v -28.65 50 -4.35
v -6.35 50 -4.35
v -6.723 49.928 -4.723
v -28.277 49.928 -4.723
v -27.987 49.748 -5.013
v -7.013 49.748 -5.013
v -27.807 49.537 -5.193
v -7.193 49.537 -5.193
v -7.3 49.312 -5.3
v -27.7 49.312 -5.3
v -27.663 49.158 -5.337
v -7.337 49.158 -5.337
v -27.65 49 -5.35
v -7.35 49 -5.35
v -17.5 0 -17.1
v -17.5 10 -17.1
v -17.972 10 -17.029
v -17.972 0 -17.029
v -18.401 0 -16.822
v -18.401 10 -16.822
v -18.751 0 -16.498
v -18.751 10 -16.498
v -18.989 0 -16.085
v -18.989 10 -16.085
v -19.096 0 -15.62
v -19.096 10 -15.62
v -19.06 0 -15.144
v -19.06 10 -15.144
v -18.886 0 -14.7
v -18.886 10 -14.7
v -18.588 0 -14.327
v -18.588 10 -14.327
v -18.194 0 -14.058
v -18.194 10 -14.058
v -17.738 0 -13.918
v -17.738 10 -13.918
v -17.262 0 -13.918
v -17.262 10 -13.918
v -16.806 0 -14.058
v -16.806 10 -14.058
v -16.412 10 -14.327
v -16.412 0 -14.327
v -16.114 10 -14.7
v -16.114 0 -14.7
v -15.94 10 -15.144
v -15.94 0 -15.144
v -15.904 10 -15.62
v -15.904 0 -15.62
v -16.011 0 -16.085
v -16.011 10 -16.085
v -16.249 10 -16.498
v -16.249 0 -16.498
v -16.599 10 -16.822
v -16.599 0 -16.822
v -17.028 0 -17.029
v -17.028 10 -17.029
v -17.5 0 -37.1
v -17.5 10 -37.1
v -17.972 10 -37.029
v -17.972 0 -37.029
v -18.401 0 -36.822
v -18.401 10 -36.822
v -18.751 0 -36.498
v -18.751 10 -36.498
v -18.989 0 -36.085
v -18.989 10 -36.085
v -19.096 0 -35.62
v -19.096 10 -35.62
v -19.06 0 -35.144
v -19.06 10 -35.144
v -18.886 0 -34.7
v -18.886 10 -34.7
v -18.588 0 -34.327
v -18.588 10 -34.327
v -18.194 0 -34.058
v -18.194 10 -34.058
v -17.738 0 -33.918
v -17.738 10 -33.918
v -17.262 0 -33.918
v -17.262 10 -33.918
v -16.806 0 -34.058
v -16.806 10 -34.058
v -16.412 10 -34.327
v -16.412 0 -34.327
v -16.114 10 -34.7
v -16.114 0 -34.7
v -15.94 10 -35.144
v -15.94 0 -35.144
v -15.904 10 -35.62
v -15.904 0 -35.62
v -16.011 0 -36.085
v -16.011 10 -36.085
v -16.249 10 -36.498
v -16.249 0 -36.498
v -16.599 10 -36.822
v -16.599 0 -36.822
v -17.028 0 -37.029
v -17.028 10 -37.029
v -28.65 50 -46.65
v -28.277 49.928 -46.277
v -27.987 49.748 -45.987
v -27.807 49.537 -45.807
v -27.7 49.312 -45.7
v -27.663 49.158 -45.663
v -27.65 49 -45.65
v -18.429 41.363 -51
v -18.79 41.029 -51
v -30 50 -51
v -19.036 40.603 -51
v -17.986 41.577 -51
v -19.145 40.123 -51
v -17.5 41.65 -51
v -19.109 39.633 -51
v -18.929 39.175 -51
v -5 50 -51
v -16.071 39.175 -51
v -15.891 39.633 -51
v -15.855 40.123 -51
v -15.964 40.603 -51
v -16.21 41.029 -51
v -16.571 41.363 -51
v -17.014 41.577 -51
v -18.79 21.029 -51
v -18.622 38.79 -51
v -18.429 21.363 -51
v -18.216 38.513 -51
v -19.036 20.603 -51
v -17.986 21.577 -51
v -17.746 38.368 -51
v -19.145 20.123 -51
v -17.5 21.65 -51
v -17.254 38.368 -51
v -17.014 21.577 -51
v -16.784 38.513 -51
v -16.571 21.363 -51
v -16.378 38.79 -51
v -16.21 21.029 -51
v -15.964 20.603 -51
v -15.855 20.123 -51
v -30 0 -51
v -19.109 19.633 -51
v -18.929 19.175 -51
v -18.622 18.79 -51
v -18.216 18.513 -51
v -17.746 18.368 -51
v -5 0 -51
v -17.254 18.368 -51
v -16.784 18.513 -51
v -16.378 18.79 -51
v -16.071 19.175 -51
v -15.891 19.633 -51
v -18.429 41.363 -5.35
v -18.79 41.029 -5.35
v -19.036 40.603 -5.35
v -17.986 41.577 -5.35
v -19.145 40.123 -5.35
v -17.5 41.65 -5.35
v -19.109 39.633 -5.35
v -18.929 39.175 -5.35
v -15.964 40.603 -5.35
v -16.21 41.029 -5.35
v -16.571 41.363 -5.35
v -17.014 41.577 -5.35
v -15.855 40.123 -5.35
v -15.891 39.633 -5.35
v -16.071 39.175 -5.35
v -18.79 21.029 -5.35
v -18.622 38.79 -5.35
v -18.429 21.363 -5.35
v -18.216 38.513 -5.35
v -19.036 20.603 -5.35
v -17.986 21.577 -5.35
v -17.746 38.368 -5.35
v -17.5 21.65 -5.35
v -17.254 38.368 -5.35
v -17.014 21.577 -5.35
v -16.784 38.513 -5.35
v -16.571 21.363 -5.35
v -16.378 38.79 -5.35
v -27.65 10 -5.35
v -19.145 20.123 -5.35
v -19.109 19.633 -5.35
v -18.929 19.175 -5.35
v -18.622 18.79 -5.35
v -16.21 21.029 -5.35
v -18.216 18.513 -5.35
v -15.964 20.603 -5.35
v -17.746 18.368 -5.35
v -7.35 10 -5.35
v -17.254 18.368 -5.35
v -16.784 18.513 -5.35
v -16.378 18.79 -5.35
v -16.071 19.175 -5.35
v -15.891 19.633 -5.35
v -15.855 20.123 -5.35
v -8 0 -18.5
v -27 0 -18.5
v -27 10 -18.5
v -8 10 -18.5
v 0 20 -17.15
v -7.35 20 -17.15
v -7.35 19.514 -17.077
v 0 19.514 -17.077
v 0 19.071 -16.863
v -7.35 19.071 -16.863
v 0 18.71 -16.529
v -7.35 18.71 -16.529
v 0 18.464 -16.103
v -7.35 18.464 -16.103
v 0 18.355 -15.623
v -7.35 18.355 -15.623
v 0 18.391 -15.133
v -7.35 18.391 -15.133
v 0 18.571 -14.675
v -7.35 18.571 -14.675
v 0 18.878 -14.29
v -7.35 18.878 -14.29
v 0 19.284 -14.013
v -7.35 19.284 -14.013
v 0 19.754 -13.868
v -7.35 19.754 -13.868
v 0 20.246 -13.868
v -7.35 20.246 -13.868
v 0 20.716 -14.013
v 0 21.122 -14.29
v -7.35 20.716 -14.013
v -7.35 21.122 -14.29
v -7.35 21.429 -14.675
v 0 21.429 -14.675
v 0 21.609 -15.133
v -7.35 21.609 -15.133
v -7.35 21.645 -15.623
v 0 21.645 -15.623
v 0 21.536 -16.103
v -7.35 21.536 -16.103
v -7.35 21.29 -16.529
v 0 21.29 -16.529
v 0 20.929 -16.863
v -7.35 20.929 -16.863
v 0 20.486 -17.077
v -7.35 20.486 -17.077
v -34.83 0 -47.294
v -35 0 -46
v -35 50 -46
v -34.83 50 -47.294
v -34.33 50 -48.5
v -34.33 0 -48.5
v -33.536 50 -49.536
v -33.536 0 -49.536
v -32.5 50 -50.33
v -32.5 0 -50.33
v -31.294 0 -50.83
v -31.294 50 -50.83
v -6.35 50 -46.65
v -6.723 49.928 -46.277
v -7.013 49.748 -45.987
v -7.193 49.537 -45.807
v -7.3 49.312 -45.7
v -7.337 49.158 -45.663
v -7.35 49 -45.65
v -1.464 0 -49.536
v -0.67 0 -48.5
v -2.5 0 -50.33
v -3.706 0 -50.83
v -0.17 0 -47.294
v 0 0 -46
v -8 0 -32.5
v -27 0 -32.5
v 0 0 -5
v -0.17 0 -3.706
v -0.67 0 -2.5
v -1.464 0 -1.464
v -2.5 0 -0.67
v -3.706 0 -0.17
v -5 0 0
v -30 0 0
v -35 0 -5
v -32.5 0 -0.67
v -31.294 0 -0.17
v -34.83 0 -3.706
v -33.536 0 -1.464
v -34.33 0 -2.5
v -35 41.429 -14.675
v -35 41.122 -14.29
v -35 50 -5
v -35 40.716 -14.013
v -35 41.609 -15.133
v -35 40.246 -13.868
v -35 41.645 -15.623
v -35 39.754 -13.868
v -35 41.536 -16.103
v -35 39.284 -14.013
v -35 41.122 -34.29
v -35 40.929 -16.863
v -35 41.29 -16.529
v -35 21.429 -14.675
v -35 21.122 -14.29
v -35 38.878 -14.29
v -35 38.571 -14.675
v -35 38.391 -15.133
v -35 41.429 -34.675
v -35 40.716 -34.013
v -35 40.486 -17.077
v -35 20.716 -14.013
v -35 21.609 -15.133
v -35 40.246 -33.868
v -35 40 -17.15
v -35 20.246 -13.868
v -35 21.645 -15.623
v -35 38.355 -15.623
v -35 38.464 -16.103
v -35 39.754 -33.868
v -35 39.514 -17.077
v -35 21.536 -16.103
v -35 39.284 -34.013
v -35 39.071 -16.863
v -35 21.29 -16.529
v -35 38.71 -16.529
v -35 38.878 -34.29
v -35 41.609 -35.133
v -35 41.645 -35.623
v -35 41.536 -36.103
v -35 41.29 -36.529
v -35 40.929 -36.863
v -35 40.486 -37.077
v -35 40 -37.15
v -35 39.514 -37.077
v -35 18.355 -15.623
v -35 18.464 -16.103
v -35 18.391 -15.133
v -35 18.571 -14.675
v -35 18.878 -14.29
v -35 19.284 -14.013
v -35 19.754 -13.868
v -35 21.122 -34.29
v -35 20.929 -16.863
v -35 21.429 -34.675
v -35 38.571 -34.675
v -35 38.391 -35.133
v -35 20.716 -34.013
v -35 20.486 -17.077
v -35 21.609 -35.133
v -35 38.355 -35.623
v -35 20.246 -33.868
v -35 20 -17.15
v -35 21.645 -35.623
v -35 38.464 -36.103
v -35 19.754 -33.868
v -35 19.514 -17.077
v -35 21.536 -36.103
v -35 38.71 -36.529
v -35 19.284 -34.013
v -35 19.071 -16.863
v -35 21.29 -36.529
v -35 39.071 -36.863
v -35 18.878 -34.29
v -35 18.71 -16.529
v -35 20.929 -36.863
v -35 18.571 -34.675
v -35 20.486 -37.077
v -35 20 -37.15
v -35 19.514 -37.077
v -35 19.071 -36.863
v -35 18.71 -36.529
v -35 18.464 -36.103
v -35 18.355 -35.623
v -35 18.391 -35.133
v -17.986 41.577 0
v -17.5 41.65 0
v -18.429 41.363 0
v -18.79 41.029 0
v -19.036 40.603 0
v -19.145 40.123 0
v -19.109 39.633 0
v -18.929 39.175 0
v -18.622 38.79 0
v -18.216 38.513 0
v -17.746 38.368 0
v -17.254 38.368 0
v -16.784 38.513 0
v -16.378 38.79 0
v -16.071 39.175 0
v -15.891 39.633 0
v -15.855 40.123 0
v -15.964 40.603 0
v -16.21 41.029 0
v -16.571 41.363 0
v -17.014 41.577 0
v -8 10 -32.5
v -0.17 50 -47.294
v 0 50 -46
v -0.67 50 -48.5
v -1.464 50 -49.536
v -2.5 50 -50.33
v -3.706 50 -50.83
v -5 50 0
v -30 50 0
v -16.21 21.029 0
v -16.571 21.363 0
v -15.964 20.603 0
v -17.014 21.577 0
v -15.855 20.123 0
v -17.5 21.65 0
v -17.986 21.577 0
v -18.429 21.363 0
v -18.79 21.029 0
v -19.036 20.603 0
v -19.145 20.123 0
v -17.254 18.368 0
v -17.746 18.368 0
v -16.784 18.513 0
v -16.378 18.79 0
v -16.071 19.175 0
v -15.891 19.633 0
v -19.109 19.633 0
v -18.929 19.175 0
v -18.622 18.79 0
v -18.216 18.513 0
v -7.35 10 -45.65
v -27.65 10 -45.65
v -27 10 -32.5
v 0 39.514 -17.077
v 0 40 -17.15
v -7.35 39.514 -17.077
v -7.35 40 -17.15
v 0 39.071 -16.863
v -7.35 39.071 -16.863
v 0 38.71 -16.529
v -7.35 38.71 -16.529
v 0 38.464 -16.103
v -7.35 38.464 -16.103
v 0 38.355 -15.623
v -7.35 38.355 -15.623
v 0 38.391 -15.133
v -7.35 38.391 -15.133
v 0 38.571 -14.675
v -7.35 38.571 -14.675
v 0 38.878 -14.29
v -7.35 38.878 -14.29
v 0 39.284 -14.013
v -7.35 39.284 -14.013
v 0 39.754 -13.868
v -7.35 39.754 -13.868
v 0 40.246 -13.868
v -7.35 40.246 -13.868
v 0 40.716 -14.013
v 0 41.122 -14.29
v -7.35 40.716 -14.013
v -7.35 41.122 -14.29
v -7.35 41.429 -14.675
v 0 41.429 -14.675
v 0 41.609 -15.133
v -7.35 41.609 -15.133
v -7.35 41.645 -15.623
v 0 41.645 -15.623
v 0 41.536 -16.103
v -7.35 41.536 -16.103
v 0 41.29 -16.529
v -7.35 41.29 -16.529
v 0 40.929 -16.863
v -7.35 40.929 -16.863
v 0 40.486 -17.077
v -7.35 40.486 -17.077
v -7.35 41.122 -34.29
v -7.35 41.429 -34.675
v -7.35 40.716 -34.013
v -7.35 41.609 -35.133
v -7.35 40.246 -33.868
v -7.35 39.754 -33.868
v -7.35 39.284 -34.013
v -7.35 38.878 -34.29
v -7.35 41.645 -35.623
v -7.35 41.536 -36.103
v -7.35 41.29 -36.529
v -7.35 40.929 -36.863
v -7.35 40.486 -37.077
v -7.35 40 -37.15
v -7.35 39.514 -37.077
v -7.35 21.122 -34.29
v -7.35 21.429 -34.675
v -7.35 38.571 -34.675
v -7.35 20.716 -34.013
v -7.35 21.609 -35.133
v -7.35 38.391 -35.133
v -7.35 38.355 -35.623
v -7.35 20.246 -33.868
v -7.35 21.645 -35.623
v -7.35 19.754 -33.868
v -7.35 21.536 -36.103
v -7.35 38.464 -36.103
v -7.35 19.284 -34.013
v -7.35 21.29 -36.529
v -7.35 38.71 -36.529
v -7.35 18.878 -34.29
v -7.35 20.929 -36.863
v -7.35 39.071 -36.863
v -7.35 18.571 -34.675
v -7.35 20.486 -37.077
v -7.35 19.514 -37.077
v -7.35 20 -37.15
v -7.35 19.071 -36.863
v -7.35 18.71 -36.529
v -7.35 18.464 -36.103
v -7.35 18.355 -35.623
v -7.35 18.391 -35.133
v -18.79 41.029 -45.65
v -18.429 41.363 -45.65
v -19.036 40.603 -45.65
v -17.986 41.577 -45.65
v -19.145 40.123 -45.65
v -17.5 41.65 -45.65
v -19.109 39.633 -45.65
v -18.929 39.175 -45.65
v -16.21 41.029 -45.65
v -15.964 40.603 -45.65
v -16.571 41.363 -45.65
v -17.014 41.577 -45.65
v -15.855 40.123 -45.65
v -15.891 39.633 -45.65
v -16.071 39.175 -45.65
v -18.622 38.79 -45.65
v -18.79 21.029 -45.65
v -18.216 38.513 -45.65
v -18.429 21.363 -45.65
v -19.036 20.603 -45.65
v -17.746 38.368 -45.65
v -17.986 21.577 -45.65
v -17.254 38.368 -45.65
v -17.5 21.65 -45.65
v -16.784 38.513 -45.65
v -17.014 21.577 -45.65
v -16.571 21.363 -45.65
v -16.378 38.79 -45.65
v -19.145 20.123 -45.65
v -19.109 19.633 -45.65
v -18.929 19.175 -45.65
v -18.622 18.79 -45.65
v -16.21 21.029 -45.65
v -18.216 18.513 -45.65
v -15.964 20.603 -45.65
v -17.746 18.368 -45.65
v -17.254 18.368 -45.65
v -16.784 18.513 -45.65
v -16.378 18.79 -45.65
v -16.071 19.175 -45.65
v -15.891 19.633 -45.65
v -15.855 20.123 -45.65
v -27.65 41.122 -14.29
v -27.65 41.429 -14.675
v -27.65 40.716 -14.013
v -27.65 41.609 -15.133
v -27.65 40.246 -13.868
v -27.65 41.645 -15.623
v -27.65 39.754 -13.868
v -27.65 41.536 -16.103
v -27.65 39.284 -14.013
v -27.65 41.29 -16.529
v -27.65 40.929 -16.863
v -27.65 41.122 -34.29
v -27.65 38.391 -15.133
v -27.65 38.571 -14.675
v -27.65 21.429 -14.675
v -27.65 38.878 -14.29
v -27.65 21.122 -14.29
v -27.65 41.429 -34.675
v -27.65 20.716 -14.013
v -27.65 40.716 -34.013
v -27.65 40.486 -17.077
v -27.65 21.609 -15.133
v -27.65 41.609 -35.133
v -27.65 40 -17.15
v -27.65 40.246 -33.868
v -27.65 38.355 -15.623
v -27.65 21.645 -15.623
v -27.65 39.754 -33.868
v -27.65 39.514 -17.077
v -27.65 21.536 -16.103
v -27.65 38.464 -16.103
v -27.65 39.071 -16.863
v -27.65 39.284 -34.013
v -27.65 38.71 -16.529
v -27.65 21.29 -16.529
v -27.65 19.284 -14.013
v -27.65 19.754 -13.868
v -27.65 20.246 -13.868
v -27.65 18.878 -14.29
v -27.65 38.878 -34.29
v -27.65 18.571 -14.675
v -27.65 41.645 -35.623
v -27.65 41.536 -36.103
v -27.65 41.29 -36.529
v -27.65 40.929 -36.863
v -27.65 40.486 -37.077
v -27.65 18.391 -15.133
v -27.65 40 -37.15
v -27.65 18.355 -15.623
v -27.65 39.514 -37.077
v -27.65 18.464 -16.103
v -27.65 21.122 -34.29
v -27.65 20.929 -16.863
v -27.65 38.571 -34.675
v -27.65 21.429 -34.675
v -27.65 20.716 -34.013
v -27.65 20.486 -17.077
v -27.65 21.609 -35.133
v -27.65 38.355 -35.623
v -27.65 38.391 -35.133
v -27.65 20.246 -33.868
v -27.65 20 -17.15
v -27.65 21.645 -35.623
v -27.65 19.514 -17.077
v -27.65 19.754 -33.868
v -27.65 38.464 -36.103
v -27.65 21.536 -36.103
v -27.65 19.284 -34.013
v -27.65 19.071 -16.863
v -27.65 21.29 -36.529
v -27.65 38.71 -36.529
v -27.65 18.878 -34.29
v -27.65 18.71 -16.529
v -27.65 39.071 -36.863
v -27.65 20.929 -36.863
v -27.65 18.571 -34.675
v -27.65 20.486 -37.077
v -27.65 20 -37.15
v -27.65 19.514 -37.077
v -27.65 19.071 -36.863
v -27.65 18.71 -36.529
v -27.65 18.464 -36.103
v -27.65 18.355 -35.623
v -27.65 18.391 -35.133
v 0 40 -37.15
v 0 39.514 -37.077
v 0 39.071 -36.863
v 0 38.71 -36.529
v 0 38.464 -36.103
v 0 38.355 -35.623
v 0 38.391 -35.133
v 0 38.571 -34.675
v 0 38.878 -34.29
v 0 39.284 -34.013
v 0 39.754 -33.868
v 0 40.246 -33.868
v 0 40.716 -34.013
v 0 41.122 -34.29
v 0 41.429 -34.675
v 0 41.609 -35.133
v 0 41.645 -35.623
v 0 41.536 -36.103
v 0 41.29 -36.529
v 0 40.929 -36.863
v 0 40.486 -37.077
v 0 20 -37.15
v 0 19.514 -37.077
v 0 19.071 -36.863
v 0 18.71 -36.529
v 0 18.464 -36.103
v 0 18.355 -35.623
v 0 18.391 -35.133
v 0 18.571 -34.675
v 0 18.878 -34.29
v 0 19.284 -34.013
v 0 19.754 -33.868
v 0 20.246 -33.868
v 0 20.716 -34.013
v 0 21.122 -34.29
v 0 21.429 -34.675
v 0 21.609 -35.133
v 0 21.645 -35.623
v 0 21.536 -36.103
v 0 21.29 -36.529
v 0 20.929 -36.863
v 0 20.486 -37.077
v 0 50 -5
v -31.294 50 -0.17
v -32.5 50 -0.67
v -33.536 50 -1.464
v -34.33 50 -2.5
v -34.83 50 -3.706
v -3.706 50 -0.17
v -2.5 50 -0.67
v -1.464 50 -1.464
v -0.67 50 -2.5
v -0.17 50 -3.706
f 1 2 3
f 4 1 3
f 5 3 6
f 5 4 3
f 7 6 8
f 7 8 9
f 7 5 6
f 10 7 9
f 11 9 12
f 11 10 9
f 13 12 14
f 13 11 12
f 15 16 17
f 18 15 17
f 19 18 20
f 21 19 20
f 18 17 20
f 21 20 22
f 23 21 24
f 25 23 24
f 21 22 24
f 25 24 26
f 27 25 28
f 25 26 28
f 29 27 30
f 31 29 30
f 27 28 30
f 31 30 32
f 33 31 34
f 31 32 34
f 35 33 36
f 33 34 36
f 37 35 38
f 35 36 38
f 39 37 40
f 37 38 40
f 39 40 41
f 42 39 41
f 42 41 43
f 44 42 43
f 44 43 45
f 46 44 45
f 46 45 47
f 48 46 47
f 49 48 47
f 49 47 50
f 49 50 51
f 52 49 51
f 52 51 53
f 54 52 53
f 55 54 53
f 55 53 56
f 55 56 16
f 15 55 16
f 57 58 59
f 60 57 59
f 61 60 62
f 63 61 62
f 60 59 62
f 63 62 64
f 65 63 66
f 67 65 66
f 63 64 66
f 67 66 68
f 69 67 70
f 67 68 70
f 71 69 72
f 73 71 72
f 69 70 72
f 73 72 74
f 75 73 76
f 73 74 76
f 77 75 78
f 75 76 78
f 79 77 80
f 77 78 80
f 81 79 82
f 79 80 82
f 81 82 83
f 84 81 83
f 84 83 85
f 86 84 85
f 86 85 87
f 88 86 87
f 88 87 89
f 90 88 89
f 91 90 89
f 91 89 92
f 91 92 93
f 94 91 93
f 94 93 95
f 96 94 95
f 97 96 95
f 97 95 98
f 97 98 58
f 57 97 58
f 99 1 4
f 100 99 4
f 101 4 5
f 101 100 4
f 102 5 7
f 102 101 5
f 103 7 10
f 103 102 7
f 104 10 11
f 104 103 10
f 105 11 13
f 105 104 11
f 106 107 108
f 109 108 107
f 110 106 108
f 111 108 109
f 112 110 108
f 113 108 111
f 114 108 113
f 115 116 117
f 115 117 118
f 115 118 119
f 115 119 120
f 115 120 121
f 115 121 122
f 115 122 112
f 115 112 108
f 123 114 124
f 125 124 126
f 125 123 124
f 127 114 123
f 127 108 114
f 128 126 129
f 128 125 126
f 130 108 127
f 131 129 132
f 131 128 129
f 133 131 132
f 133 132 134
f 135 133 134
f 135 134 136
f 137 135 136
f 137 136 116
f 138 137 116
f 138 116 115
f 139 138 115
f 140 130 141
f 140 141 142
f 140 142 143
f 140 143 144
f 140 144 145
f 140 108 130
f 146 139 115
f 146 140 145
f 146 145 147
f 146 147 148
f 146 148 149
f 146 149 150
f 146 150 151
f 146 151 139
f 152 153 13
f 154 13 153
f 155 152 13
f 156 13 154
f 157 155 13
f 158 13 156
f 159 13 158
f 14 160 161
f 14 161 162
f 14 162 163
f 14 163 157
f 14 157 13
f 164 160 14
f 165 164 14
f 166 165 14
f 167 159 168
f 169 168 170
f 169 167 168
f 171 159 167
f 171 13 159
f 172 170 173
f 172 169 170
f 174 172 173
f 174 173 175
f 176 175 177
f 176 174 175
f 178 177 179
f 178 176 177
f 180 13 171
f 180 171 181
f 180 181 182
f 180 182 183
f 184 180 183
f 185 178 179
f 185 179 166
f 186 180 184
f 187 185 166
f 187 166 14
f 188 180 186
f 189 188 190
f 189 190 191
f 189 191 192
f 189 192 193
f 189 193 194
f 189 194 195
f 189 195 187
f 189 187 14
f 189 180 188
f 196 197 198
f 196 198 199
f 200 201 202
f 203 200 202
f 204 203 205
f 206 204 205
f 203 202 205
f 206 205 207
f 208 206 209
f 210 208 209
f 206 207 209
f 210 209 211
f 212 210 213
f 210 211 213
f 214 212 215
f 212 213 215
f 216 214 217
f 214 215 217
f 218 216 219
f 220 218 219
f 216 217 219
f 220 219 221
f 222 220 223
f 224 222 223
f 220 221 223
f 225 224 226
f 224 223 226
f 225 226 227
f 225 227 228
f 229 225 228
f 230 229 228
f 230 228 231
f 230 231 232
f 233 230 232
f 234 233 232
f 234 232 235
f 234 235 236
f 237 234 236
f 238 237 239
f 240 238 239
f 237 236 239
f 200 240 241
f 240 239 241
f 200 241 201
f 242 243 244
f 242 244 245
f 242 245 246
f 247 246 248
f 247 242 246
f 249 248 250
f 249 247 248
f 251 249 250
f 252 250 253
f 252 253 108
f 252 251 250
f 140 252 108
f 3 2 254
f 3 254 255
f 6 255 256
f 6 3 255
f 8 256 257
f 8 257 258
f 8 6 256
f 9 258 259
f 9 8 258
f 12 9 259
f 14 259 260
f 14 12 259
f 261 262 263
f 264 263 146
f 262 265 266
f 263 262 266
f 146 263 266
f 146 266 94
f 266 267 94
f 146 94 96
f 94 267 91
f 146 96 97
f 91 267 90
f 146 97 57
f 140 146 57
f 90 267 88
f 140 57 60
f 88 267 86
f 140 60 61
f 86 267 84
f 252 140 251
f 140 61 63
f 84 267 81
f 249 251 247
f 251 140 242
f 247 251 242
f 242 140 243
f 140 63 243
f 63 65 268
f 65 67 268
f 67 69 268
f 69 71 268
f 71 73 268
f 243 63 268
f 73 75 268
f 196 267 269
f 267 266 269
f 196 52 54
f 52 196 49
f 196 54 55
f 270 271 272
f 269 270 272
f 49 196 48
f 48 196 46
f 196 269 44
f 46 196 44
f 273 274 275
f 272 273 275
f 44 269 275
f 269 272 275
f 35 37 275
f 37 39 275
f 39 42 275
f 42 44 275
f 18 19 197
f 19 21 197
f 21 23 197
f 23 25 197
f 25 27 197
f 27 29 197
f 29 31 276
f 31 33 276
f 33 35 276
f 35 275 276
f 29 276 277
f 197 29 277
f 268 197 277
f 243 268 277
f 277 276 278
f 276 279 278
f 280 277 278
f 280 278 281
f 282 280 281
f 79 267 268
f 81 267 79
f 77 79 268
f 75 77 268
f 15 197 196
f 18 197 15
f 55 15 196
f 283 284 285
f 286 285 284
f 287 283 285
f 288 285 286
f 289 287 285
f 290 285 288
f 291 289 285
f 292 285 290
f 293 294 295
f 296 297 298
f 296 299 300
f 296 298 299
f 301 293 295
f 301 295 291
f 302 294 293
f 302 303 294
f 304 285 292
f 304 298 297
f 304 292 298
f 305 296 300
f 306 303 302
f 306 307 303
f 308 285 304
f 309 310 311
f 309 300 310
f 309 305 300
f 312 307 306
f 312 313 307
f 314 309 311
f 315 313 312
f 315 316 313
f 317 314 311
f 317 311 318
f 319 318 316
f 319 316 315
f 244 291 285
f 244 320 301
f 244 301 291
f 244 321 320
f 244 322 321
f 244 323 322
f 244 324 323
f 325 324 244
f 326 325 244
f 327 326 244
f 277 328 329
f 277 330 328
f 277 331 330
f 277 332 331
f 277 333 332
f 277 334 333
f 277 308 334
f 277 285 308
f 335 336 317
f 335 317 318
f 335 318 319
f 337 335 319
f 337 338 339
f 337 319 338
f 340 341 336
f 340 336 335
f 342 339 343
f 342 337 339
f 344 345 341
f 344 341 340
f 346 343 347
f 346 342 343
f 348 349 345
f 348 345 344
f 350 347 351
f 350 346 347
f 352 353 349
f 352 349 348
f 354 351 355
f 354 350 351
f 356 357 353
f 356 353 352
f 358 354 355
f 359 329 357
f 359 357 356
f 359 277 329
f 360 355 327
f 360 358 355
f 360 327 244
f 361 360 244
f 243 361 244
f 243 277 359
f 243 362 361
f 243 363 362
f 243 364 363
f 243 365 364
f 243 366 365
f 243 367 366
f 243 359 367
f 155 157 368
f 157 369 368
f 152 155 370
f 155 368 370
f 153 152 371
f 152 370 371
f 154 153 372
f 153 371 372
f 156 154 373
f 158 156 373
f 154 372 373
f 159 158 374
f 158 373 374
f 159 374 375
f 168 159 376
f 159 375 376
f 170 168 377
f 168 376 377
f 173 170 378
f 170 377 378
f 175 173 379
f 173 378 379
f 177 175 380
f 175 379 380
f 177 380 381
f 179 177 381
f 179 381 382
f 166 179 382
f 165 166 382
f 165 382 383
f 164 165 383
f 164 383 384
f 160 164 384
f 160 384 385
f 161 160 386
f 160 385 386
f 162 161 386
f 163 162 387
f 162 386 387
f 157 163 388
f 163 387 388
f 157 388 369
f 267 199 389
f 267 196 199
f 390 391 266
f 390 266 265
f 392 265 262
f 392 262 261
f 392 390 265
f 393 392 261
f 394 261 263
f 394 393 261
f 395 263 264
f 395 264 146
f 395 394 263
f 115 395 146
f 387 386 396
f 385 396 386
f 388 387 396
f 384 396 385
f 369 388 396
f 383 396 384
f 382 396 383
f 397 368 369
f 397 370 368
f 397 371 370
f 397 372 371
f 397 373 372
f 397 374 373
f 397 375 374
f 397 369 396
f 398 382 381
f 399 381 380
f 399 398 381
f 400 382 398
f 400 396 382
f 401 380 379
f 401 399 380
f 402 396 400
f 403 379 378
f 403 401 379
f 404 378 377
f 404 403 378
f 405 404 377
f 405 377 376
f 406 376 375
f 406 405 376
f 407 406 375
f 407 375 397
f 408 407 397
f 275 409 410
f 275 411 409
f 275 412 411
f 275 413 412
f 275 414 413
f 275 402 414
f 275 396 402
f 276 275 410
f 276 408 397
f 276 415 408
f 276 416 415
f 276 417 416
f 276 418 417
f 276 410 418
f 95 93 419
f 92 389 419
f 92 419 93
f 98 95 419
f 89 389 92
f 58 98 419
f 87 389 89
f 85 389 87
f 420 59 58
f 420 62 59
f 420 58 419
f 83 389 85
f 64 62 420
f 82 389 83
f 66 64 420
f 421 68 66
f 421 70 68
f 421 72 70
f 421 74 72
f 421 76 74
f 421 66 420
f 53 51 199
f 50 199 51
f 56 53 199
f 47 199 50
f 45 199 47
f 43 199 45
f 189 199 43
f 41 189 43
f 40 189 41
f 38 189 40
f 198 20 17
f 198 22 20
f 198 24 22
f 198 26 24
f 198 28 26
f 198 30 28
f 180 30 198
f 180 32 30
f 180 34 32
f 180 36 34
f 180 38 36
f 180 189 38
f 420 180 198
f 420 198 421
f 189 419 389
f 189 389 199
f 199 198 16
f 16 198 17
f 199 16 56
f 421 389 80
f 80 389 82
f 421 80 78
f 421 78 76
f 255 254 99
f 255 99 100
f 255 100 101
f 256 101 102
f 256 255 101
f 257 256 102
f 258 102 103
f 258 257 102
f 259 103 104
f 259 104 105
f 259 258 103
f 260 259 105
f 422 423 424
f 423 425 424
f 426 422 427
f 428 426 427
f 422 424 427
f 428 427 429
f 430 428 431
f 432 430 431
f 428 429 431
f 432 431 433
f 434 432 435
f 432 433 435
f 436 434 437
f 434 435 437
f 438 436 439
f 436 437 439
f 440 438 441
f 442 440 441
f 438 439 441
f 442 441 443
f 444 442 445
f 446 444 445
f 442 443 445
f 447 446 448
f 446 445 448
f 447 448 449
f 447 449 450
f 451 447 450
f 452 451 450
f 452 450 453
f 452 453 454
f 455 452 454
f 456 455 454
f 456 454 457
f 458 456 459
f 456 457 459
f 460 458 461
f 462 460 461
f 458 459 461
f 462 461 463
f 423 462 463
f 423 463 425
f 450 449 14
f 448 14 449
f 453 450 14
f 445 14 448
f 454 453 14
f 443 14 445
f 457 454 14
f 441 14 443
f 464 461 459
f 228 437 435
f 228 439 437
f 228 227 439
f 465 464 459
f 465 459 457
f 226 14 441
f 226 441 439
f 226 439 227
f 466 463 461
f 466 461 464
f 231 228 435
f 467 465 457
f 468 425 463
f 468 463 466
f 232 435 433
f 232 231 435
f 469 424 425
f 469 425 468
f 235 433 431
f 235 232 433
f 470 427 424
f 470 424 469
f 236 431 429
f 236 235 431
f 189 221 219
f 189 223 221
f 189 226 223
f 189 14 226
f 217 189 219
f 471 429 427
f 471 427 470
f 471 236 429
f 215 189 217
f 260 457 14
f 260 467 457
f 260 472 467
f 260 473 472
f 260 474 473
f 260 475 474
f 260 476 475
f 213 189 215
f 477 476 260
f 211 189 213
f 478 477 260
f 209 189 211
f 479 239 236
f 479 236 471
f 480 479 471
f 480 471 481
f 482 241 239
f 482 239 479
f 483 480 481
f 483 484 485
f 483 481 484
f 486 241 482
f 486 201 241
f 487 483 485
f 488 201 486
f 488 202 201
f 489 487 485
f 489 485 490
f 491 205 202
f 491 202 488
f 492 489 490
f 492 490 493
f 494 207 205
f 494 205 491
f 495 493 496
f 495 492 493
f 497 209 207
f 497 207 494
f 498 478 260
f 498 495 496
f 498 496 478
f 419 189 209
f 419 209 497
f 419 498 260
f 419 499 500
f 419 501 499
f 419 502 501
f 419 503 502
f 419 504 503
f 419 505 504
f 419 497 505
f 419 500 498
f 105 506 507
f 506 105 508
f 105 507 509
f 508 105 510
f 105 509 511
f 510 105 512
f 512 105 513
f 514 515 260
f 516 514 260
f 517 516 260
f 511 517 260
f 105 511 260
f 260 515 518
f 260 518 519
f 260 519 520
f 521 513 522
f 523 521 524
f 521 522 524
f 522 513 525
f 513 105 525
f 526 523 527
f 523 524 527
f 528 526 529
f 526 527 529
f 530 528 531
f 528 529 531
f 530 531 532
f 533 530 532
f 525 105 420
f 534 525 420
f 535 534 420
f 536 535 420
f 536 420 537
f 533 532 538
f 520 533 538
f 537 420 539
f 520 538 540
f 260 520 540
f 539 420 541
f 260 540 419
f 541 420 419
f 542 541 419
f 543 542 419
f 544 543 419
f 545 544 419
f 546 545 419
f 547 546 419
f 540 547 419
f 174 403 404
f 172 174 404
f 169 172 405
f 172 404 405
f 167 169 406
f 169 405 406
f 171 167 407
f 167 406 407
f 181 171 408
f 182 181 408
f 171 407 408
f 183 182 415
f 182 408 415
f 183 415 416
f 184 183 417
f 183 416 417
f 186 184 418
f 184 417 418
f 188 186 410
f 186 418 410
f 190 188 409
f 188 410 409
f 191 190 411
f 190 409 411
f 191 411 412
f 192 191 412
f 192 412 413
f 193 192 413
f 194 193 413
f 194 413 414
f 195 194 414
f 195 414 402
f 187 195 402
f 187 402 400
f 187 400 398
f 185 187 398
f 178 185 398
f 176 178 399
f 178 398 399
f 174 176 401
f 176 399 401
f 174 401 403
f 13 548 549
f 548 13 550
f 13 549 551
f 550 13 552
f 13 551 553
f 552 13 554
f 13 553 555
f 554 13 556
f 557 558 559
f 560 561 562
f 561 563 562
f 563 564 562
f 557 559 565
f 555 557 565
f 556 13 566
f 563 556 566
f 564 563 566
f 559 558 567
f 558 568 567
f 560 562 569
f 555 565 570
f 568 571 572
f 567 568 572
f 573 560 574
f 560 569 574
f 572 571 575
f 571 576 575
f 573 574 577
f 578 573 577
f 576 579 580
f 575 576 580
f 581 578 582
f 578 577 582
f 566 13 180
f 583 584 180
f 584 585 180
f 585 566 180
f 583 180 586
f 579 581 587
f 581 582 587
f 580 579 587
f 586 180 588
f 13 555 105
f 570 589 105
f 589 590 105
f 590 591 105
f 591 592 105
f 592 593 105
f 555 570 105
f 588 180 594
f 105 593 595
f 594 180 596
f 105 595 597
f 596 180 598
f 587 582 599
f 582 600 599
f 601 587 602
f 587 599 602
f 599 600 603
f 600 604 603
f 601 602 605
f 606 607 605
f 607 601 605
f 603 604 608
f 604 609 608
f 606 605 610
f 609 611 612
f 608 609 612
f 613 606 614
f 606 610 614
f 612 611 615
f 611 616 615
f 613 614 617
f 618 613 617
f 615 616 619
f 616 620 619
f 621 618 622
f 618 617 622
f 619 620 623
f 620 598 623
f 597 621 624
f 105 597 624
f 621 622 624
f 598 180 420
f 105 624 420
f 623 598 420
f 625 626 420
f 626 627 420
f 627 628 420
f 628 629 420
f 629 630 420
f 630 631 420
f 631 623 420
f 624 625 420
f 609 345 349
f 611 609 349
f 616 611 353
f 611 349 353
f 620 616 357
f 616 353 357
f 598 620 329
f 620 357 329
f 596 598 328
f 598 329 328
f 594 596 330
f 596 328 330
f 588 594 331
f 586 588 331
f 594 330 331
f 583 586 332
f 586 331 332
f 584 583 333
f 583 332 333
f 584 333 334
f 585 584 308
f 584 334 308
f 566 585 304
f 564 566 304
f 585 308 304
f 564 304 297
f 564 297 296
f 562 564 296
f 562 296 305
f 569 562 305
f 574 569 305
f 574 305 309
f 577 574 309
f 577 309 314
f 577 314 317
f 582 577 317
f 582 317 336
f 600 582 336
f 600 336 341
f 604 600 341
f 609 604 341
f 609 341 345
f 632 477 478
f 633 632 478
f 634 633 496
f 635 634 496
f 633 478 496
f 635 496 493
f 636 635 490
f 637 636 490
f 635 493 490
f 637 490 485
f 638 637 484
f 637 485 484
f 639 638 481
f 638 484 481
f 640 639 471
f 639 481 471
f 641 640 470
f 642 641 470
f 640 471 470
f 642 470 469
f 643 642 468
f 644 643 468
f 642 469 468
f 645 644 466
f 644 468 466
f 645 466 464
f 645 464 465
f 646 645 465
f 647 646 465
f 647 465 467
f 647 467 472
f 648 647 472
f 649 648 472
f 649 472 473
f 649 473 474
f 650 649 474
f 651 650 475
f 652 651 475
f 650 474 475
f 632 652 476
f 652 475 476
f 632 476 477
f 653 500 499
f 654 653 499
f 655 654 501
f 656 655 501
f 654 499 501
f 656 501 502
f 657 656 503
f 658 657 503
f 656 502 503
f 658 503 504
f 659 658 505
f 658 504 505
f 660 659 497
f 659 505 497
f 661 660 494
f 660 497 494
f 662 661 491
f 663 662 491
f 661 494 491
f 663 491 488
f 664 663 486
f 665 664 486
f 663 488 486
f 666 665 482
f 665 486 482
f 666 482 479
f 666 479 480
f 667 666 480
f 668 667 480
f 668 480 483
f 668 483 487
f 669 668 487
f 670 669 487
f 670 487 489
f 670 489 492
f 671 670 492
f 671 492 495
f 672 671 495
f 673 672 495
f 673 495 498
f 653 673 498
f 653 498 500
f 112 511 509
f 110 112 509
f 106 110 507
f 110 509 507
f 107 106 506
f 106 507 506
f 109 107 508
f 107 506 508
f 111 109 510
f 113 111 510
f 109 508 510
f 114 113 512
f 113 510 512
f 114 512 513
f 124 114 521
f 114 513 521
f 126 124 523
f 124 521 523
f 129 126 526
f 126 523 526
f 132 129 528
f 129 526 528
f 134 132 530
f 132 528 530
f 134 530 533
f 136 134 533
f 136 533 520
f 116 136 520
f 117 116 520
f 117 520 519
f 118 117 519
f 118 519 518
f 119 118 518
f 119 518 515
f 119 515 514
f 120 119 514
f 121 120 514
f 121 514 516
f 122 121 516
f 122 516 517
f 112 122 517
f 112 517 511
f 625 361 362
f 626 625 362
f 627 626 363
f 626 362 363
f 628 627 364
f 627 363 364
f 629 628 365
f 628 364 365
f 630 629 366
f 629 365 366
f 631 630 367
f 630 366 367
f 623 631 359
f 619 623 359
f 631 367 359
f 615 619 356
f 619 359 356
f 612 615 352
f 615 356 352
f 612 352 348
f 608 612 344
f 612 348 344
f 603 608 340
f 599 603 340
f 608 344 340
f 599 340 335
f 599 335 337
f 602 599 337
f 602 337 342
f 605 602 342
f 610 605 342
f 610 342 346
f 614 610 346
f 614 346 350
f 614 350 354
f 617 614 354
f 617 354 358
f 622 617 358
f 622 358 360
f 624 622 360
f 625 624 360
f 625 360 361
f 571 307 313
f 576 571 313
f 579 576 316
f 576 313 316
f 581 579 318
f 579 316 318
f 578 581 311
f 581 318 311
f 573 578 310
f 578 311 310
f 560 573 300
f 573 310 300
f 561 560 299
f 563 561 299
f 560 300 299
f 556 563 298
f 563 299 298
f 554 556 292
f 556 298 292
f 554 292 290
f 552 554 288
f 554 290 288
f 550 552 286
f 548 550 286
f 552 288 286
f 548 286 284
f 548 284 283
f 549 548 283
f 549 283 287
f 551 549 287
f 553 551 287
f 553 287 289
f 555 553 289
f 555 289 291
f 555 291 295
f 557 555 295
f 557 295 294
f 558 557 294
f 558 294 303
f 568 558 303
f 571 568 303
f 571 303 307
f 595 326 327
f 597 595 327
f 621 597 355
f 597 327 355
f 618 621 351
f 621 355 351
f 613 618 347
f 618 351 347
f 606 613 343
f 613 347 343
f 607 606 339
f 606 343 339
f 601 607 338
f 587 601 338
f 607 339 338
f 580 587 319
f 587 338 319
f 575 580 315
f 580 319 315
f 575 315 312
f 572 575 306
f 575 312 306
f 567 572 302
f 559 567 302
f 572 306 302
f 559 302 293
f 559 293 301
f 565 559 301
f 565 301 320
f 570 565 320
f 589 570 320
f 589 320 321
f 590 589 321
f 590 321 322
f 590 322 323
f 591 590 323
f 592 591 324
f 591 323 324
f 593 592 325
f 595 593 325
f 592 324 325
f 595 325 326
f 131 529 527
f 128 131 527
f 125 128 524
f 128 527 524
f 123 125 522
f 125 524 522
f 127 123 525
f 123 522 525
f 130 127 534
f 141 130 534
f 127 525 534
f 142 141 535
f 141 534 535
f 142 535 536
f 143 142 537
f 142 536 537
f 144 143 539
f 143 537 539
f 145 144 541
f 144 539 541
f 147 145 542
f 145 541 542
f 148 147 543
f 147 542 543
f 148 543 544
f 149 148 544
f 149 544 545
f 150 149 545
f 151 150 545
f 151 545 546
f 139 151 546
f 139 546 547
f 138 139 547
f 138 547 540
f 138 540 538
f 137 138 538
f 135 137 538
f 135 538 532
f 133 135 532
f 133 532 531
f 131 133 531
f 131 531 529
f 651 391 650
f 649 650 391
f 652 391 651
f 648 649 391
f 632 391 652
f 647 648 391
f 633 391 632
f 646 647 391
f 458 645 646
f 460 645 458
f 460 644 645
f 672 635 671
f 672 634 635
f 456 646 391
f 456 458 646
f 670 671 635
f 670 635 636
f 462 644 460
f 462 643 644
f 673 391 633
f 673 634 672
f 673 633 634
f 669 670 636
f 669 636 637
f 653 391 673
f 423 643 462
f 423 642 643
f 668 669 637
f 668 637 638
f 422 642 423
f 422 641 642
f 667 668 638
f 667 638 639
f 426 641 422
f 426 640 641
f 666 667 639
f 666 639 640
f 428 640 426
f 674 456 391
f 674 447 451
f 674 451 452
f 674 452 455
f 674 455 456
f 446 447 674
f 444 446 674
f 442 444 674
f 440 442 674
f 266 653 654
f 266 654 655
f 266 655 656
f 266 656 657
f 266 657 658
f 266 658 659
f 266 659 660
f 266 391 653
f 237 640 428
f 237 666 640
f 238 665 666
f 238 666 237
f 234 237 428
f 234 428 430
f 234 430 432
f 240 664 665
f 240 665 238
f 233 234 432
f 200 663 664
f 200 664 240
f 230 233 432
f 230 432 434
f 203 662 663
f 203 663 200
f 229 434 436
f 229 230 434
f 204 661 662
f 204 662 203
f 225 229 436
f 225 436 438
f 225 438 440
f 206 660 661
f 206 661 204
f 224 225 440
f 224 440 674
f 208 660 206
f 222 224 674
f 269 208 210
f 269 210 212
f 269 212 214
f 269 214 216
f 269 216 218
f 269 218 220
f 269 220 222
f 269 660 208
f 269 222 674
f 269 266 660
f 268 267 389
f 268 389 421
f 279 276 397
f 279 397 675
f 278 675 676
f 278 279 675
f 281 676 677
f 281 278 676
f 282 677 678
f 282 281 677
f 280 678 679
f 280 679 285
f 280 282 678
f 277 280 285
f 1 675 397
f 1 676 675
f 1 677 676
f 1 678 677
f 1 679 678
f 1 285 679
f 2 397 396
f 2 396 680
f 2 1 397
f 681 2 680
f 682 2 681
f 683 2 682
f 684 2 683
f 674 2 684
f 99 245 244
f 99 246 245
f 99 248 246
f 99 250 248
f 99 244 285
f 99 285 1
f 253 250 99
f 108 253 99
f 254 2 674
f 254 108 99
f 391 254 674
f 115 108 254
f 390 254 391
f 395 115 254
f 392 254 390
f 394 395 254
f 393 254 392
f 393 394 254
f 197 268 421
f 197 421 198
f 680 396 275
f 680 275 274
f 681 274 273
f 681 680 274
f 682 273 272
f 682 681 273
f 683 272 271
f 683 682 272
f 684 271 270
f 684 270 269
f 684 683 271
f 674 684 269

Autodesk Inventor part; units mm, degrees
ref_plane "YZ Plane" through (0, 0, 0) normal (1, 0, 0) x (0, 1, 0)
ref_plane "XZ Plane" through (0, 0, 0) normal (0, 1, 0) x (-1, 0, 0)
ref_plane "XY Plane" through (0, 0, 0) normal (0, 0, 1) x (1, 0, 0)
sketch "スケッチ1" plane through (0, 0, 0) normal (0, 1, 0) x (-1, 0, 0)
  line L0 (0, 0) -> (35, 0)
  line L1 (35, 0) -> (35, -51)
  line L2 (35, -51) -> (0, -51)
  line L3 (0, -51) -> (0, 0)
  dimension "d0" = 35
  dimension "d1" = 51
extrude "押し出し1" add sketch "スケッチ1" along normal blind 10
sketch "スケッチ2" plane through (0, 10, 0) normal (0, 1, 0) x (1, 0, 0)
  line L0 (-35, 51) -> (-35, 0) projected
  line L1 (-35, 0) -> (0, 0) projected
  line L2 (-17.5, 0) -> (-17.5, 51)
  line L3 (0, 51) -> (-35, 51) projected
  line L4 (-35, 25.5) -> (0, 25.5)
  line L5 (0, 0) -> (0, 51) projected
  line L6 (-17.5, 25.5) -> (-27.65, 25.5)
  line L7 (-27.65, 25.5) -> (-27.65, 45.65)
  line L8 (-27.65, 45.65) -> (-17.5, 45.65)
  line L9 (-17.5, 45.65) -> (-17.5, 25.5)
  line L10 (-27.65, 25.5) -> (-27.65, 5.35)
  line L11 (-27.65, 5.35) -> (-17.5, 5.35)
  line L12 (-7.35, 25.5) -> (-7.35, 45.65)
  line L13 (-7.35, 45.65) -> (-17.5, 45.65)
  line L14 (-7.35, 25.5) -> (-7.35, 5.35)
  line L15 (-7.35, 5.35) -> (-17.5, 5.35)
  dimension "d7" = 20.15
  dimension "d8" = 10.15
extrude "押し出し2" add sketch "スケッチ2" along normal blind 40 contours L3 L2 L8 L7 L4 L0 | L4 L10 L11 L2 L1 L0 | L3 L5 L4 L12 L13 L2 | L2 L15 L14 L4 L5 L1
fillet "フィレット1" radius 5 4 edges at (0, 25, 0) (0, 25, -51) (-35, 25, -51) (-35, 25, 0)
sketch "スケッチ3" plane through (0, 0, -5) normal (1, 0, 0) x (0, 0, -1)
  line L0 (40.65, 50) -> (0.35, 50) projected
  line L1 (20.5, 50) -> (20.5, 0)
  line L2 (0, 0) -> (41, 0) projected
  line L3 (10.5, 50) -> (10.5, 0)
  line L4 (0, 50) -> (0, 0) projected
  line L5 (0, 10) -> (62, 10)
  line L6 (0.35, 10) -> (40.65, 10) projected
  point P0 (-5, 0)
  point P1 (10.5, 20)
  point P2 (10.5, 40)
  point P3 (30.5, 20)
  point P4 (30.5, 40)
  dimension "d12" = 10
  dimension "d13" = 10
  dimension "d14" = 10
  dimension "d15" = 20
hole "穴1" at (0, 20, -15.5) at (0, 40, -15.5) at (0, 40, -35.5) at (0, 20, -35.5) direction (-1, 0, 0) diameter 3.3 end through all
sketch "スケッチ4" plane through (-5, 0, -51) normal (0, 0, -1) x (-1, 0, 0)
  line L0 (0, 50) -> (0, 0) projected
  line L1 (0, 10) -> (25, 10)
  line L2 (25, 0) -> (25, 50) projected
  line L3 (0, 0) -> (25, 0) projected
  line L4 (2.35, 50) -> (22.65, 50) projected
  line L5 (12.5, 50) -> (12.5, 10)
  point P0 (-5, 0)
  point P1 (12.5, 20)
  point P2 (12.5, 40)
  dimension "d23" = 10
  dimension "d24" = 10
  dimension "d25" = 20
hole "穴2" at (-17.5, 20, -51) at (-17.5, 40, -51) direction (0, 0, 1) diameter 3.3 end through all
sketch "スケッチ5" plane through (0, 0, 0) normal (0, -1, 0) x (1, 0, 0)
  line L0 (-30, 0) -> (-5, 0) projected
  line L1 (-17.5, 0) -> (-17.5, -51)
  line L2 (-15.85, -51) -> (-19.15, -51) projected
  line L3 (0, -5) -> (0, -46) projected
  line L4 (0, -25.5) -> (-35, -25.5)
  line L5 (-35, -46) -> (-35, -5) projected
  point P0 (0, 0)
  point P1 (-17.5, -15.5)
  point P2 (-17.5, -35.5)
  dimension "d33" = 10
hole "穴3" at (-17.5, 0, -15.5) at (-17.5, 0, -35.5) direction (0, 1, 0) diameter 3.2 end through all
fillet "フィレット2" radius 1 4 edges at (-7.35, 50, -25.5) (-17.5, 50, -5.35) (-27.65, 50, -25.5) (-17.5, 50, -45.65)
sketch "スケッチ6" plane through (0, 0, 0) normal (0, -1, 0) x (1, 0, 0)
  line L0 (-27, -18.5) -> (-8, -18.5)
  line L1 (-8, -18.5) -> (-8, -32.5)
  line L2 (-8, -32.5) -> (-27, -32.5)
  line L3 (-27, -32.5) -> (-27, -18.5)
  circle A0 centre (-17.5, -15.5) radius 1.6 projected
  circle A1 centre (-17.5, -35.5) radius 1.6 projected
  line L4 (0, -5) -> (0, -46) projected
  line L5 (-35, -46) -> (-35, -5) projected
  point P0 (0, 0)
  dimension "d42" = 3
  dimension "d43" = 3
  dimension "d44" = 8
  dimension "d45" = 8
extrude "押し出し3" cut sketch "スケッチ6" against normal blind 10 contours L0 L1 L2 L3
properties part number "framefixpart2"
